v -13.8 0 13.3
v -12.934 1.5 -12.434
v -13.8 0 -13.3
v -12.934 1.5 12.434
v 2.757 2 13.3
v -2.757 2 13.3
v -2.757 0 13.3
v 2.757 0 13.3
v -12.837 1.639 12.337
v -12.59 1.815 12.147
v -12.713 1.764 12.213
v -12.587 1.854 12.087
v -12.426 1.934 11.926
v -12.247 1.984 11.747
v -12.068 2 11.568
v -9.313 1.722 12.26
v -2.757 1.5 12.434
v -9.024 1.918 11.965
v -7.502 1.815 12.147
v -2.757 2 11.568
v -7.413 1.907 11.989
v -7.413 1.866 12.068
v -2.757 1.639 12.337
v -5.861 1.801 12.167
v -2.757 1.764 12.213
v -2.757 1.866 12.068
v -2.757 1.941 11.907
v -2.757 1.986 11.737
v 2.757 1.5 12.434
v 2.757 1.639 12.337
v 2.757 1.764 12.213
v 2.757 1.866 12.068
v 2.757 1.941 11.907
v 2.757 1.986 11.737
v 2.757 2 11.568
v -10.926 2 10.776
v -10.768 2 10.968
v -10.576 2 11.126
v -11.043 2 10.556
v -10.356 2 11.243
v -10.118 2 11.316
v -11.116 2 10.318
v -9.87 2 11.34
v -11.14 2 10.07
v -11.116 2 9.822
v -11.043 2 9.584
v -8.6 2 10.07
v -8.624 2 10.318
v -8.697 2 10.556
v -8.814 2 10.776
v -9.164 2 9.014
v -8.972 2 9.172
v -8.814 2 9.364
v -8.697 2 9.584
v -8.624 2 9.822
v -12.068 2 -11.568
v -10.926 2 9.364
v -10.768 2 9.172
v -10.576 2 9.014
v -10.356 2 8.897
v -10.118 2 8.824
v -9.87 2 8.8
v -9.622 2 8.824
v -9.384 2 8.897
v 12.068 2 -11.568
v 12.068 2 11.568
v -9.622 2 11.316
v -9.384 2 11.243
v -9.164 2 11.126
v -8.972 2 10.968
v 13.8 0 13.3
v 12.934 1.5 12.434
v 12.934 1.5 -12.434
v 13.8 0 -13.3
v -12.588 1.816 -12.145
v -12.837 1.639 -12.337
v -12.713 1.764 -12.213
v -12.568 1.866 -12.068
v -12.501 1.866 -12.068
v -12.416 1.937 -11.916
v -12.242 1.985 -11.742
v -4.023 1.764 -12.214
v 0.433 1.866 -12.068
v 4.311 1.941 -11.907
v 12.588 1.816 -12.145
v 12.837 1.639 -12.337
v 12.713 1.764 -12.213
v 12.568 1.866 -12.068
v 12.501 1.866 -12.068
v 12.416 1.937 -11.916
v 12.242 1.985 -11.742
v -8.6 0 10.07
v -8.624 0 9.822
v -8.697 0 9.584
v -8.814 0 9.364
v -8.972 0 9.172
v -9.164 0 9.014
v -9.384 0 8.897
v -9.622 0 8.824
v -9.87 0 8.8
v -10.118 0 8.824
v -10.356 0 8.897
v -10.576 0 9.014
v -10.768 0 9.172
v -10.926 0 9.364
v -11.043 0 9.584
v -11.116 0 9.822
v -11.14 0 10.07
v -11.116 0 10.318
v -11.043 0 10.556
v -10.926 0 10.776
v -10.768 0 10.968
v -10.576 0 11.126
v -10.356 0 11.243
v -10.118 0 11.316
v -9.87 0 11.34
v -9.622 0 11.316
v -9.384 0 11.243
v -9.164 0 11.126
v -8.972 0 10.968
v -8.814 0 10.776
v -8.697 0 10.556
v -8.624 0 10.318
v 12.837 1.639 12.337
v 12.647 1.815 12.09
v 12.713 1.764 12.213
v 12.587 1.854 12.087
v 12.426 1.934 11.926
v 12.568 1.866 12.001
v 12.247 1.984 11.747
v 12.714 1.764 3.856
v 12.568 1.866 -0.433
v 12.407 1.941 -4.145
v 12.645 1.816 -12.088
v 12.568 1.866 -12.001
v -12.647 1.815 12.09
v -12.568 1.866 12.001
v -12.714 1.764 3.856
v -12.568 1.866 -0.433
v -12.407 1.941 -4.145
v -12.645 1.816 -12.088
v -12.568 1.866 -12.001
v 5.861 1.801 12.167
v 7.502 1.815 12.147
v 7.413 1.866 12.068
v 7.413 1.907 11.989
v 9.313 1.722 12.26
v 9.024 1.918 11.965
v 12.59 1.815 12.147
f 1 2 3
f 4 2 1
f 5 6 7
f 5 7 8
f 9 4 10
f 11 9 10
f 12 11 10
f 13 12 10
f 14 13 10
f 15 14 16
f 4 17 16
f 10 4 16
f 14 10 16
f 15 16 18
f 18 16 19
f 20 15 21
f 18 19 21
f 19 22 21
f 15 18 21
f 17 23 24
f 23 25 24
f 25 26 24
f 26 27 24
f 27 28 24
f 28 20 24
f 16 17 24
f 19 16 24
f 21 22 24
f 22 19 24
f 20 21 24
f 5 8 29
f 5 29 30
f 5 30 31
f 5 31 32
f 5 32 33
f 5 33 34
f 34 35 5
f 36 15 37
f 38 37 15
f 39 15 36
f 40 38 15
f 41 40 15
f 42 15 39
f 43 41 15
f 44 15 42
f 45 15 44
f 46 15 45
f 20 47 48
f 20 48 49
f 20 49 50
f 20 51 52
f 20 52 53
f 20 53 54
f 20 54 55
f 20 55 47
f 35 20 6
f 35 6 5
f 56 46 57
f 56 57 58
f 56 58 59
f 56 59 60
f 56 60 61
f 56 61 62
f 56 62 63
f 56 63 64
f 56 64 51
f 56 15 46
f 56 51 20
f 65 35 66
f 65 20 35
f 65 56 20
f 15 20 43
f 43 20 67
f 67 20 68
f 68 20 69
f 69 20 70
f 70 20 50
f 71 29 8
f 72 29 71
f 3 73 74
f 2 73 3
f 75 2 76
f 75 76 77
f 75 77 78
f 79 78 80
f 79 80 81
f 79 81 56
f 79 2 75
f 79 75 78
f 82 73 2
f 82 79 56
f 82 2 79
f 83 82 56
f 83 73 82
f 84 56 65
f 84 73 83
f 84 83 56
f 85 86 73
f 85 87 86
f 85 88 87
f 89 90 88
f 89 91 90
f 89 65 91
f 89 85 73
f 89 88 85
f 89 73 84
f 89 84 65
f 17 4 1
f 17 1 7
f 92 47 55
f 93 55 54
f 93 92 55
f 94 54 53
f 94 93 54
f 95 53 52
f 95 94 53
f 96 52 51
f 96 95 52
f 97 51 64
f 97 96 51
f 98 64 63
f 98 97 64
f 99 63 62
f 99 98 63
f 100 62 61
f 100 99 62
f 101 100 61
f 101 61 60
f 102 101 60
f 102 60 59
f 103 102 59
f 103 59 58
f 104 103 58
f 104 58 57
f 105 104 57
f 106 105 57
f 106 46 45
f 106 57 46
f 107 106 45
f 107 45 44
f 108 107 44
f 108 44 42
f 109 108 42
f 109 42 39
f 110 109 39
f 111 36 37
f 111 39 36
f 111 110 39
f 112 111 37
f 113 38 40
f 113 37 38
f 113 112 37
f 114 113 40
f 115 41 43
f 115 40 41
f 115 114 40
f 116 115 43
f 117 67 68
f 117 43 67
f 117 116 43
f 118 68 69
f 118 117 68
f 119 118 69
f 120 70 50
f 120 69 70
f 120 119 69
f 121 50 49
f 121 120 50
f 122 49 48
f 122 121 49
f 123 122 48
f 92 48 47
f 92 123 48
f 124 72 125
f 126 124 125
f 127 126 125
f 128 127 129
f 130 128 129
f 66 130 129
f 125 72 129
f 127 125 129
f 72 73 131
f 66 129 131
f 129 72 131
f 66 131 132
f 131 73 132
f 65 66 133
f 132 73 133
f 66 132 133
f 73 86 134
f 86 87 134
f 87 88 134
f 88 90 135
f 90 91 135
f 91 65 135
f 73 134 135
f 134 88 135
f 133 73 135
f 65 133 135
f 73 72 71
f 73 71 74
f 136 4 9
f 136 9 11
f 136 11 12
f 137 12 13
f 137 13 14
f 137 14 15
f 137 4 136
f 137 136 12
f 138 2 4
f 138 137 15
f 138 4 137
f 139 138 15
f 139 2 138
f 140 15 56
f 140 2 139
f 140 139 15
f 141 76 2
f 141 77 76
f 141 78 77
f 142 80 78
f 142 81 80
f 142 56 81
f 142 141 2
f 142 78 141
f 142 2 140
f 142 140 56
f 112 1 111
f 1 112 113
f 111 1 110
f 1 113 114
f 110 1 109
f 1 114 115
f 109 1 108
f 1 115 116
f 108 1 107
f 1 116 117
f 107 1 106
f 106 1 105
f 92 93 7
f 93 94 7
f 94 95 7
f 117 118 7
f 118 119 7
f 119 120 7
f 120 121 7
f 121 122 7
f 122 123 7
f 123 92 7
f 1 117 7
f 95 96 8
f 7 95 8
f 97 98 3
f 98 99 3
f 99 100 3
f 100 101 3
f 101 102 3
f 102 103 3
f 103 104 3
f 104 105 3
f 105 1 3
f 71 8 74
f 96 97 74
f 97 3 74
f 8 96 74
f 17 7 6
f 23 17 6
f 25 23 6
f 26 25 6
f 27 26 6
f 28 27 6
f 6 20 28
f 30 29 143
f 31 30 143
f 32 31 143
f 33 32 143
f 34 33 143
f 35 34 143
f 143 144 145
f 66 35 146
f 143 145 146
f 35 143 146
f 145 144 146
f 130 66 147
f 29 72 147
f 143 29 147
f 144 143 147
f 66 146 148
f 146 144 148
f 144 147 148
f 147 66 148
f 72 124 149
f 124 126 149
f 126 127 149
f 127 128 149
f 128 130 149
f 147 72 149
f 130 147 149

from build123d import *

# Parameters (mm, degrees)
SKETCH1_W           = 27.6
SKETCH1_H           = 26.6
BOSS_EXTRUDE1_DEPTH = 2
BOSS_EXTRUDE1_TAPER = 30
SKETCH2_W           = 5.514509834
SKETCH2_H           = 2
BOSS_EXTRUDE2_DEPTH = 13.3
SKETCH3_R           = 1.27
CUT_EXTRUDE1_DEPTH  = 3.0000001
FILLET5_R           = 1


with BuildPart() as part:
    # Sketch1 → Boss-Extrude1 (new body)
    with BuildSketch(Plane(origin=(0, 0, 0), x_dir=(1, 0, 0), z_dir=(0, 1, 0))):
        Rectangle(SKETCH1_W, SKETCH1_H)
    extrude(amount=BOSS_EXTRUDE1_DEPTH, taper=BOSS_EXTRUDE1_TAPER)

    # Sketch2 → Boss-Extrude2 (add)
    with BuildSketch(Plane.XY):
        with Locations((0, 1)):
            Rectangle(SKETCH2_W, SKETCH2_H)
    extrude(amount=BOSS_EXTRUDE2_DEPTH)

    # Sketch3 → Cut-Extrude1 (cut, through all)
    with BuildSketch(Plane(origin=(0, 0, 0), x_dir=(1, 0, 0), z_dir=(0, 1, 0))):
        with Locations((-9.87, -10.07)):
            Circle(SKETCH3_R)
    extrude(amount=CUT_EXTRUDE1_DEPTH, mode=Mode.SUBTRACT)

    # Fillet5
    fillet5_edges = [part.edges().sort_by_distance(p)[0] for p in [
        (-12.645299462, 2, 0),
        (-7.701277189, 2, 12.145299462),
        (7.701277189, 2, 12.145299462),
        (12.645299462, 2, 0),
        (0, 2, -12.145299462),
    ]]
    fillet(fillet5_edges, radius=FILLET5_R)


solid = part.part
